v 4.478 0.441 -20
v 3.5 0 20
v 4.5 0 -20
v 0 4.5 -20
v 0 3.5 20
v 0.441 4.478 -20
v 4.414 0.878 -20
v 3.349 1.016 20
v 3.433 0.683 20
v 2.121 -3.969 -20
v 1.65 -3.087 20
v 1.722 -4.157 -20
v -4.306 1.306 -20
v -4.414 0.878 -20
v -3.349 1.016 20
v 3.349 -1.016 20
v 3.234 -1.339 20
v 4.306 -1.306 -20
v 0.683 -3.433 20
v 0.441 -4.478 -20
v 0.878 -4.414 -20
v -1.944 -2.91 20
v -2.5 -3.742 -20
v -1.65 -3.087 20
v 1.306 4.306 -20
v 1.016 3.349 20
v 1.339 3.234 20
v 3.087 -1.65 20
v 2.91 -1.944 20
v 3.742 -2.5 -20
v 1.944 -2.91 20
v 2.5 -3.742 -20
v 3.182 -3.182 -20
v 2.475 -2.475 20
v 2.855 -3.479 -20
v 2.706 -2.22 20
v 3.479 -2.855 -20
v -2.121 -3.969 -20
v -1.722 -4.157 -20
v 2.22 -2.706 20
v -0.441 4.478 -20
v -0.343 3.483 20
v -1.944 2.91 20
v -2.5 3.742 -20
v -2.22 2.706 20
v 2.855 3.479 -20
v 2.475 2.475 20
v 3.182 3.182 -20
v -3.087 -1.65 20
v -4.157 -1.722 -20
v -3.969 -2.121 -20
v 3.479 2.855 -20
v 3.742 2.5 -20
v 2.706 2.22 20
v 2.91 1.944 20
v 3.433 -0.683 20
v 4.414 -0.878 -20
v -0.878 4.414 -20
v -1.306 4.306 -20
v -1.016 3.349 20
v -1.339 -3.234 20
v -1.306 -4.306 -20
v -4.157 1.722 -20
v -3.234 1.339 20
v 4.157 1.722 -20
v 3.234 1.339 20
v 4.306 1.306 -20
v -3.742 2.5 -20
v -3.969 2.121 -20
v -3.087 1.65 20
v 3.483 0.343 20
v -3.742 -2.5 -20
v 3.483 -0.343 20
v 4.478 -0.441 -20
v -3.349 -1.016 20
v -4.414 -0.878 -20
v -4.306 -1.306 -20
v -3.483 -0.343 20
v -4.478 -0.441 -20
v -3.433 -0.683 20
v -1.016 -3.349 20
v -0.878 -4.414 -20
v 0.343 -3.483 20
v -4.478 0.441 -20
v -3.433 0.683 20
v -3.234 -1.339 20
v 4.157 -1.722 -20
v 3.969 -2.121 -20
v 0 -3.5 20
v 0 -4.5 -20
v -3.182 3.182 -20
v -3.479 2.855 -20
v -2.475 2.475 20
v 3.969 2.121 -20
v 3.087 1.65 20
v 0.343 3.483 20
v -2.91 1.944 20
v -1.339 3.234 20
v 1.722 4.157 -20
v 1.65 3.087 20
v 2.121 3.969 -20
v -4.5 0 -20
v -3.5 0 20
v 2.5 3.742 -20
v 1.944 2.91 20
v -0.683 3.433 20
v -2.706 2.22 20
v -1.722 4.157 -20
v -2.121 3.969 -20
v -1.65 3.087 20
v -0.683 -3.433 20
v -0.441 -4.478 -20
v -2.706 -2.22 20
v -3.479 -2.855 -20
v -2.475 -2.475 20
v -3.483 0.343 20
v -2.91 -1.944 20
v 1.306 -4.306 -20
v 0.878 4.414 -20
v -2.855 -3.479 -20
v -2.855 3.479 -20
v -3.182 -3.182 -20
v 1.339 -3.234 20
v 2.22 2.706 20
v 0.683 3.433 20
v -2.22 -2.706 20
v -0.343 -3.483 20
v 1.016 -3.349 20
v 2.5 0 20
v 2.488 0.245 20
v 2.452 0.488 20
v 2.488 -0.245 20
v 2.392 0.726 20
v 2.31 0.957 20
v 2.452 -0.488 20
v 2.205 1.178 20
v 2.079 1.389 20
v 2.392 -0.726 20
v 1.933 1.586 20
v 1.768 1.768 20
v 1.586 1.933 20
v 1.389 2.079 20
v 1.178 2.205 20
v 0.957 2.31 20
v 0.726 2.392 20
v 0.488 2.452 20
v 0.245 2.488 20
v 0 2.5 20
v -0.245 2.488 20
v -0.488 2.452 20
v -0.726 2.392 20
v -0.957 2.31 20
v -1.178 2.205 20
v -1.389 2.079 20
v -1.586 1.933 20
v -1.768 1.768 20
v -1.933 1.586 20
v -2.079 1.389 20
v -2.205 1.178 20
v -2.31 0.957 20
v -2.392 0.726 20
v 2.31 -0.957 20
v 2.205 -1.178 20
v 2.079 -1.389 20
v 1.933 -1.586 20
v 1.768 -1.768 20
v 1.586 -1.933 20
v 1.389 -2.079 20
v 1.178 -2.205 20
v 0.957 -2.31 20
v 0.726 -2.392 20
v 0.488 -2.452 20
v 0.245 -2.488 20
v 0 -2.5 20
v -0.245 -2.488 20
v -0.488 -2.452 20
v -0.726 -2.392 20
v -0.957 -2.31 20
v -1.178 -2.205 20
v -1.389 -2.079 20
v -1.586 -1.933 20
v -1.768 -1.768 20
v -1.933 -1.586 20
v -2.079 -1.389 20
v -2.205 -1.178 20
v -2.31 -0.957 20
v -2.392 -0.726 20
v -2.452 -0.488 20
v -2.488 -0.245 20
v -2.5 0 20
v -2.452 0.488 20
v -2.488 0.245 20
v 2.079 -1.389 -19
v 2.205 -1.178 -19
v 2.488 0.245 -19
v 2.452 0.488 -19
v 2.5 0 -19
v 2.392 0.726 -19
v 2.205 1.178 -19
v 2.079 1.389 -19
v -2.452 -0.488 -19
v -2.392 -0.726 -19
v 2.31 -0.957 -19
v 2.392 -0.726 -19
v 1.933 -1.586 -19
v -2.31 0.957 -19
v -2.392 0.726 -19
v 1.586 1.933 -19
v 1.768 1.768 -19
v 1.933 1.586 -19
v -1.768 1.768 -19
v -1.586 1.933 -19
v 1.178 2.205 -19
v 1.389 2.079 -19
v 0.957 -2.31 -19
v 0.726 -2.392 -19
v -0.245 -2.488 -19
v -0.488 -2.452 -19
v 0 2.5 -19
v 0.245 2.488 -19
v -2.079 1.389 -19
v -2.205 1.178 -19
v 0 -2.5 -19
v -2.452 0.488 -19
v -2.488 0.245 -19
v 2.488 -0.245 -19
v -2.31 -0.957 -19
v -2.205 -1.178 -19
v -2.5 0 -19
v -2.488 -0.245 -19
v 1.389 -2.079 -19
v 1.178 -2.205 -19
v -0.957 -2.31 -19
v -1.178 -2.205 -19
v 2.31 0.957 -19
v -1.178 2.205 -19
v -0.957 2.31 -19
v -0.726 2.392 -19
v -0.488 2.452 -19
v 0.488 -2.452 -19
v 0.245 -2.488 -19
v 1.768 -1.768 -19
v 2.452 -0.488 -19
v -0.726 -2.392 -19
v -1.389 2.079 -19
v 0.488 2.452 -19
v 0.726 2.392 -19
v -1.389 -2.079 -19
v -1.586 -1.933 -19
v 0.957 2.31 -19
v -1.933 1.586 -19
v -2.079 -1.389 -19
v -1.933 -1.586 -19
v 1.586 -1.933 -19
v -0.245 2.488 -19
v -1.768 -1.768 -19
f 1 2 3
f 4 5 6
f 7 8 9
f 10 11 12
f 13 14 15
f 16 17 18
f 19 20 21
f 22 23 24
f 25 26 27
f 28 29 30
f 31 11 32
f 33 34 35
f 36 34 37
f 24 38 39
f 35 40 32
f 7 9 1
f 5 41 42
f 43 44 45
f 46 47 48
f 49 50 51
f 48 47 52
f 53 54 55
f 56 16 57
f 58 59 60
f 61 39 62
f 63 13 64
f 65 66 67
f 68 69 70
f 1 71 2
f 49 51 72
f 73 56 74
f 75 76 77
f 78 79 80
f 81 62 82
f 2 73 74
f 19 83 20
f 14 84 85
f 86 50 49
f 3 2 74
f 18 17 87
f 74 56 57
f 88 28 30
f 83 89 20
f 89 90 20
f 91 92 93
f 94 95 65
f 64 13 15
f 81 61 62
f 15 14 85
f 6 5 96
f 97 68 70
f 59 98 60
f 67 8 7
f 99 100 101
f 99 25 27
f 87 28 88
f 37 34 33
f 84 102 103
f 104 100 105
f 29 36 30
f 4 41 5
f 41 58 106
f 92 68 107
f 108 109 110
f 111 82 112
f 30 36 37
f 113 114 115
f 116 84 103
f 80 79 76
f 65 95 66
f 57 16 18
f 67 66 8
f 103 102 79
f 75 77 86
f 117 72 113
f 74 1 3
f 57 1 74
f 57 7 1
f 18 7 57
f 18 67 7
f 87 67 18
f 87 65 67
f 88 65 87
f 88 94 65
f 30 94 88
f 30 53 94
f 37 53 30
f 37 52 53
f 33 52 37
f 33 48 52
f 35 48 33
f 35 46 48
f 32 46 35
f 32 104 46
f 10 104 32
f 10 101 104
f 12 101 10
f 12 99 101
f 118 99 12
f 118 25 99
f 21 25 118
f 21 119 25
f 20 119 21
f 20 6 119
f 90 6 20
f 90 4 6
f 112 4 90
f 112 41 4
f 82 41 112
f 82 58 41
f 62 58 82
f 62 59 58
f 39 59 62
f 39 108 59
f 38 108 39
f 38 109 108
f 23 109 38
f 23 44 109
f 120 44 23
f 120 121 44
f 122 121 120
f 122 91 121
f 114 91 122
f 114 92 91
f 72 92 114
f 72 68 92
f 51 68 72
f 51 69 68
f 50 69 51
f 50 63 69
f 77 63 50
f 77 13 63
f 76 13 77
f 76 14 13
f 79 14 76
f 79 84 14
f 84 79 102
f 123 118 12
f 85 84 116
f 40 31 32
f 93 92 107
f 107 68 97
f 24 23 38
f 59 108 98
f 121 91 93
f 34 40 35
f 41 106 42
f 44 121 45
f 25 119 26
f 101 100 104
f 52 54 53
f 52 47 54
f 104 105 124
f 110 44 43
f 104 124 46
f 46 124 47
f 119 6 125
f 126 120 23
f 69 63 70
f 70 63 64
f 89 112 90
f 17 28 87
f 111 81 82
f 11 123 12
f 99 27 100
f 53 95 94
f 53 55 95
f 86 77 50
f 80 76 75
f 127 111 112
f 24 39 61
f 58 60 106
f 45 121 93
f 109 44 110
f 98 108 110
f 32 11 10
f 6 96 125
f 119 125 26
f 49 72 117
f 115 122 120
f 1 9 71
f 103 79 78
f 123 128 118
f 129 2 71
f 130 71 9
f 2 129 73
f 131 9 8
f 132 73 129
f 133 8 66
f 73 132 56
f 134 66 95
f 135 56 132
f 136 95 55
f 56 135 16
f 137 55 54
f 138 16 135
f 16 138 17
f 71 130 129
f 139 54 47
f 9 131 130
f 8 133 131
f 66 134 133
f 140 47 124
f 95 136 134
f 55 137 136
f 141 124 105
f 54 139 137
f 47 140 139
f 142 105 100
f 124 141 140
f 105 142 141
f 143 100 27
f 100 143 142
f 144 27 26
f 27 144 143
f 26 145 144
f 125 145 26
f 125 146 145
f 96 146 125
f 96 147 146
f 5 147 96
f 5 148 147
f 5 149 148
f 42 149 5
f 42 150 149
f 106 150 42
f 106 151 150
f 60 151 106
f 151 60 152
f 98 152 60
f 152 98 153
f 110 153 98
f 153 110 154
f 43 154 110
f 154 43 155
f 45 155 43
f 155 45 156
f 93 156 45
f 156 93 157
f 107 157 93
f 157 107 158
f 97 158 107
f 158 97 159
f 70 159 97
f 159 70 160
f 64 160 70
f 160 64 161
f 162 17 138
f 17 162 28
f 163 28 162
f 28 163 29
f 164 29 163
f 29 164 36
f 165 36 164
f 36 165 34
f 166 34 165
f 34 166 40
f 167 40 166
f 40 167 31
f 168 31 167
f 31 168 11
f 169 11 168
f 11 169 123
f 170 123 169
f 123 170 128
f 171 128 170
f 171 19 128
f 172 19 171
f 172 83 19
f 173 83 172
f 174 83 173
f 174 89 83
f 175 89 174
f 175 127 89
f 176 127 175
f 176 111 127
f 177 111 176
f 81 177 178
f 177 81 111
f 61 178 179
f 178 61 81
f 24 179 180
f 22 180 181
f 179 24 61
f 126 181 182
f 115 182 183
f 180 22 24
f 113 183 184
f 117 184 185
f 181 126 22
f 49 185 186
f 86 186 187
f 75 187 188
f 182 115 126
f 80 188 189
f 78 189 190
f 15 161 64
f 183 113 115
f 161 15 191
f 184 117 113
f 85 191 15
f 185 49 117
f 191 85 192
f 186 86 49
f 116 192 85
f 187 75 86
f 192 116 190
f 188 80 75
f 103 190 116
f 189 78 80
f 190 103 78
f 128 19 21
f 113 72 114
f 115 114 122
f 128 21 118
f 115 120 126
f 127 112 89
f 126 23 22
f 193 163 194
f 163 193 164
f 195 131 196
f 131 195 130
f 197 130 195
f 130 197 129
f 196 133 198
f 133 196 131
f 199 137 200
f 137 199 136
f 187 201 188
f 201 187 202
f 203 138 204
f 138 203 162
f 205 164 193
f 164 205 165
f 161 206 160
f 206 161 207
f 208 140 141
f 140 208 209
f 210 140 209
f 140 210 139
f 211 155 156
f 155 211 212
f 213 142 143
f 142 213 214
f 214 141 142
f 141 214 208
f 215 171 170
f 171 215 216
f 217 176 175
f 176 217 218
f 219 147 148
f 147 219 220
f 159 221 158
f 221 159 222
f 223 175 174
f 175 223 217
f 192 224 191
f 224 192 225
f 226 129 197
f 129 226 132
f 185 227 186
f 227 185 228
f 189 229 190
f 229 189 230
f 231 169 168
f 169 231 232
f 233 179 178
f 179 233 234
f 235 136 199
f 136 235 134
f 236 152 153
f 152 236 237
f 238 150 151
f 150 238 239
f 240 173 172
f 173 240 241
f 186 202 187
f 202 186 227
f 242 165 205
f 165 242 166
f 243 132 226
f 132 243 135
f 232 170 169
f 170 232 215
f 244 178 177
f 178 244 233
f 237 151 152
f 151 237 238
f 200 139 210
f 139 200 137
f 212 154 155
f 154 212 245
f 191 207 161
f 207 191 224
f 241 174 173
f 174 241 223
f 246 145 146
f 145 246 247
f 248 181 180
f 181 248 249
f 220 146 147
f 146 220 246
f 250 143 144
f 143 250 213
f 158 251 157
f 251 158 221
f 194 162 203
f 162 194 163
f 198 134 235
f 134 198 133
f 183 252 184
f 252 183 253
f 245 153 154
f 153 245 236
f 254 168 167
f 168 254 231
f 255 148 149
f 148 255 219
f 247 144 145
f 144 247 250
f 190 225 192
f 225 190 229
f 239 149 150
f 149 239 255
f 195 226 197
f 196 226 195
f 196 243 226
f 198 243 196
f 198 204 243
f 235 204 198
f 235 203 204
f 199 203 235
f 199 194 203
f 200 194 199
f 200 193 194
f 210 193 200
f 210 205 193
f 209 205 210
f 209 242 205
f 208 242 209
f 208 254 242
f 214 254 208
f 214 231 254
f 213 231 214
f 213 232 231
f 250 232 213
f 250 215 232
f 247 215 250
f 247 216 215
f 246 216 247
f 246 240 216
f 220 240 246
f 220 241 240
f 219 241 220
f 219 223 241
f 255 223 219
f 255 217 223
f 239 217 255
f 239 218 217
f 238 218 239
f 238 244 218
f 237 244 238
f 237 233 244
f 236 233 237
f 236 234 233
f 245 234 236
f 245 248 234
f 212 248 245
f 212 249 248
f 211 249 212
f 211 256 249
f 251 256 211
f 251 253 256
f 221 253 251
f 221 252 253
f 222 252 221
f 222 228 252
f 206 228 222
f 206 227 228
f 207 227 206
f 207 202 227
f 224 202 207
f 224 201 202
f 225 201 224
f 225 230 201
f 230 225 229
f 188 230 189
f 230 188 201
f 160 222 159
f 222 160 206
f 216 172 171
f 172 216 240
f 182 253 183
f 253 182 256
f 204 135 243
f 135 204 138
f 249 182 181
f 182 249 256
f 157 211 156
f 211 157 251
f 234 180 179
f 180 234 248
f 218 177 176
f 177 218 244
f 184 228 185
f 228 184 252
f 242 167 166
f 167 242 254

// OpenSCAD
difference() 
{

	cylinder(h = 40, r1 = 4.5, r2 = 3.5, center = true, $fn = 64);
	translate([0,0,1])
    		cylinder(h = 40, r1 = 2.5, r2 = 2.5, center = true, $fn = 64);
}
